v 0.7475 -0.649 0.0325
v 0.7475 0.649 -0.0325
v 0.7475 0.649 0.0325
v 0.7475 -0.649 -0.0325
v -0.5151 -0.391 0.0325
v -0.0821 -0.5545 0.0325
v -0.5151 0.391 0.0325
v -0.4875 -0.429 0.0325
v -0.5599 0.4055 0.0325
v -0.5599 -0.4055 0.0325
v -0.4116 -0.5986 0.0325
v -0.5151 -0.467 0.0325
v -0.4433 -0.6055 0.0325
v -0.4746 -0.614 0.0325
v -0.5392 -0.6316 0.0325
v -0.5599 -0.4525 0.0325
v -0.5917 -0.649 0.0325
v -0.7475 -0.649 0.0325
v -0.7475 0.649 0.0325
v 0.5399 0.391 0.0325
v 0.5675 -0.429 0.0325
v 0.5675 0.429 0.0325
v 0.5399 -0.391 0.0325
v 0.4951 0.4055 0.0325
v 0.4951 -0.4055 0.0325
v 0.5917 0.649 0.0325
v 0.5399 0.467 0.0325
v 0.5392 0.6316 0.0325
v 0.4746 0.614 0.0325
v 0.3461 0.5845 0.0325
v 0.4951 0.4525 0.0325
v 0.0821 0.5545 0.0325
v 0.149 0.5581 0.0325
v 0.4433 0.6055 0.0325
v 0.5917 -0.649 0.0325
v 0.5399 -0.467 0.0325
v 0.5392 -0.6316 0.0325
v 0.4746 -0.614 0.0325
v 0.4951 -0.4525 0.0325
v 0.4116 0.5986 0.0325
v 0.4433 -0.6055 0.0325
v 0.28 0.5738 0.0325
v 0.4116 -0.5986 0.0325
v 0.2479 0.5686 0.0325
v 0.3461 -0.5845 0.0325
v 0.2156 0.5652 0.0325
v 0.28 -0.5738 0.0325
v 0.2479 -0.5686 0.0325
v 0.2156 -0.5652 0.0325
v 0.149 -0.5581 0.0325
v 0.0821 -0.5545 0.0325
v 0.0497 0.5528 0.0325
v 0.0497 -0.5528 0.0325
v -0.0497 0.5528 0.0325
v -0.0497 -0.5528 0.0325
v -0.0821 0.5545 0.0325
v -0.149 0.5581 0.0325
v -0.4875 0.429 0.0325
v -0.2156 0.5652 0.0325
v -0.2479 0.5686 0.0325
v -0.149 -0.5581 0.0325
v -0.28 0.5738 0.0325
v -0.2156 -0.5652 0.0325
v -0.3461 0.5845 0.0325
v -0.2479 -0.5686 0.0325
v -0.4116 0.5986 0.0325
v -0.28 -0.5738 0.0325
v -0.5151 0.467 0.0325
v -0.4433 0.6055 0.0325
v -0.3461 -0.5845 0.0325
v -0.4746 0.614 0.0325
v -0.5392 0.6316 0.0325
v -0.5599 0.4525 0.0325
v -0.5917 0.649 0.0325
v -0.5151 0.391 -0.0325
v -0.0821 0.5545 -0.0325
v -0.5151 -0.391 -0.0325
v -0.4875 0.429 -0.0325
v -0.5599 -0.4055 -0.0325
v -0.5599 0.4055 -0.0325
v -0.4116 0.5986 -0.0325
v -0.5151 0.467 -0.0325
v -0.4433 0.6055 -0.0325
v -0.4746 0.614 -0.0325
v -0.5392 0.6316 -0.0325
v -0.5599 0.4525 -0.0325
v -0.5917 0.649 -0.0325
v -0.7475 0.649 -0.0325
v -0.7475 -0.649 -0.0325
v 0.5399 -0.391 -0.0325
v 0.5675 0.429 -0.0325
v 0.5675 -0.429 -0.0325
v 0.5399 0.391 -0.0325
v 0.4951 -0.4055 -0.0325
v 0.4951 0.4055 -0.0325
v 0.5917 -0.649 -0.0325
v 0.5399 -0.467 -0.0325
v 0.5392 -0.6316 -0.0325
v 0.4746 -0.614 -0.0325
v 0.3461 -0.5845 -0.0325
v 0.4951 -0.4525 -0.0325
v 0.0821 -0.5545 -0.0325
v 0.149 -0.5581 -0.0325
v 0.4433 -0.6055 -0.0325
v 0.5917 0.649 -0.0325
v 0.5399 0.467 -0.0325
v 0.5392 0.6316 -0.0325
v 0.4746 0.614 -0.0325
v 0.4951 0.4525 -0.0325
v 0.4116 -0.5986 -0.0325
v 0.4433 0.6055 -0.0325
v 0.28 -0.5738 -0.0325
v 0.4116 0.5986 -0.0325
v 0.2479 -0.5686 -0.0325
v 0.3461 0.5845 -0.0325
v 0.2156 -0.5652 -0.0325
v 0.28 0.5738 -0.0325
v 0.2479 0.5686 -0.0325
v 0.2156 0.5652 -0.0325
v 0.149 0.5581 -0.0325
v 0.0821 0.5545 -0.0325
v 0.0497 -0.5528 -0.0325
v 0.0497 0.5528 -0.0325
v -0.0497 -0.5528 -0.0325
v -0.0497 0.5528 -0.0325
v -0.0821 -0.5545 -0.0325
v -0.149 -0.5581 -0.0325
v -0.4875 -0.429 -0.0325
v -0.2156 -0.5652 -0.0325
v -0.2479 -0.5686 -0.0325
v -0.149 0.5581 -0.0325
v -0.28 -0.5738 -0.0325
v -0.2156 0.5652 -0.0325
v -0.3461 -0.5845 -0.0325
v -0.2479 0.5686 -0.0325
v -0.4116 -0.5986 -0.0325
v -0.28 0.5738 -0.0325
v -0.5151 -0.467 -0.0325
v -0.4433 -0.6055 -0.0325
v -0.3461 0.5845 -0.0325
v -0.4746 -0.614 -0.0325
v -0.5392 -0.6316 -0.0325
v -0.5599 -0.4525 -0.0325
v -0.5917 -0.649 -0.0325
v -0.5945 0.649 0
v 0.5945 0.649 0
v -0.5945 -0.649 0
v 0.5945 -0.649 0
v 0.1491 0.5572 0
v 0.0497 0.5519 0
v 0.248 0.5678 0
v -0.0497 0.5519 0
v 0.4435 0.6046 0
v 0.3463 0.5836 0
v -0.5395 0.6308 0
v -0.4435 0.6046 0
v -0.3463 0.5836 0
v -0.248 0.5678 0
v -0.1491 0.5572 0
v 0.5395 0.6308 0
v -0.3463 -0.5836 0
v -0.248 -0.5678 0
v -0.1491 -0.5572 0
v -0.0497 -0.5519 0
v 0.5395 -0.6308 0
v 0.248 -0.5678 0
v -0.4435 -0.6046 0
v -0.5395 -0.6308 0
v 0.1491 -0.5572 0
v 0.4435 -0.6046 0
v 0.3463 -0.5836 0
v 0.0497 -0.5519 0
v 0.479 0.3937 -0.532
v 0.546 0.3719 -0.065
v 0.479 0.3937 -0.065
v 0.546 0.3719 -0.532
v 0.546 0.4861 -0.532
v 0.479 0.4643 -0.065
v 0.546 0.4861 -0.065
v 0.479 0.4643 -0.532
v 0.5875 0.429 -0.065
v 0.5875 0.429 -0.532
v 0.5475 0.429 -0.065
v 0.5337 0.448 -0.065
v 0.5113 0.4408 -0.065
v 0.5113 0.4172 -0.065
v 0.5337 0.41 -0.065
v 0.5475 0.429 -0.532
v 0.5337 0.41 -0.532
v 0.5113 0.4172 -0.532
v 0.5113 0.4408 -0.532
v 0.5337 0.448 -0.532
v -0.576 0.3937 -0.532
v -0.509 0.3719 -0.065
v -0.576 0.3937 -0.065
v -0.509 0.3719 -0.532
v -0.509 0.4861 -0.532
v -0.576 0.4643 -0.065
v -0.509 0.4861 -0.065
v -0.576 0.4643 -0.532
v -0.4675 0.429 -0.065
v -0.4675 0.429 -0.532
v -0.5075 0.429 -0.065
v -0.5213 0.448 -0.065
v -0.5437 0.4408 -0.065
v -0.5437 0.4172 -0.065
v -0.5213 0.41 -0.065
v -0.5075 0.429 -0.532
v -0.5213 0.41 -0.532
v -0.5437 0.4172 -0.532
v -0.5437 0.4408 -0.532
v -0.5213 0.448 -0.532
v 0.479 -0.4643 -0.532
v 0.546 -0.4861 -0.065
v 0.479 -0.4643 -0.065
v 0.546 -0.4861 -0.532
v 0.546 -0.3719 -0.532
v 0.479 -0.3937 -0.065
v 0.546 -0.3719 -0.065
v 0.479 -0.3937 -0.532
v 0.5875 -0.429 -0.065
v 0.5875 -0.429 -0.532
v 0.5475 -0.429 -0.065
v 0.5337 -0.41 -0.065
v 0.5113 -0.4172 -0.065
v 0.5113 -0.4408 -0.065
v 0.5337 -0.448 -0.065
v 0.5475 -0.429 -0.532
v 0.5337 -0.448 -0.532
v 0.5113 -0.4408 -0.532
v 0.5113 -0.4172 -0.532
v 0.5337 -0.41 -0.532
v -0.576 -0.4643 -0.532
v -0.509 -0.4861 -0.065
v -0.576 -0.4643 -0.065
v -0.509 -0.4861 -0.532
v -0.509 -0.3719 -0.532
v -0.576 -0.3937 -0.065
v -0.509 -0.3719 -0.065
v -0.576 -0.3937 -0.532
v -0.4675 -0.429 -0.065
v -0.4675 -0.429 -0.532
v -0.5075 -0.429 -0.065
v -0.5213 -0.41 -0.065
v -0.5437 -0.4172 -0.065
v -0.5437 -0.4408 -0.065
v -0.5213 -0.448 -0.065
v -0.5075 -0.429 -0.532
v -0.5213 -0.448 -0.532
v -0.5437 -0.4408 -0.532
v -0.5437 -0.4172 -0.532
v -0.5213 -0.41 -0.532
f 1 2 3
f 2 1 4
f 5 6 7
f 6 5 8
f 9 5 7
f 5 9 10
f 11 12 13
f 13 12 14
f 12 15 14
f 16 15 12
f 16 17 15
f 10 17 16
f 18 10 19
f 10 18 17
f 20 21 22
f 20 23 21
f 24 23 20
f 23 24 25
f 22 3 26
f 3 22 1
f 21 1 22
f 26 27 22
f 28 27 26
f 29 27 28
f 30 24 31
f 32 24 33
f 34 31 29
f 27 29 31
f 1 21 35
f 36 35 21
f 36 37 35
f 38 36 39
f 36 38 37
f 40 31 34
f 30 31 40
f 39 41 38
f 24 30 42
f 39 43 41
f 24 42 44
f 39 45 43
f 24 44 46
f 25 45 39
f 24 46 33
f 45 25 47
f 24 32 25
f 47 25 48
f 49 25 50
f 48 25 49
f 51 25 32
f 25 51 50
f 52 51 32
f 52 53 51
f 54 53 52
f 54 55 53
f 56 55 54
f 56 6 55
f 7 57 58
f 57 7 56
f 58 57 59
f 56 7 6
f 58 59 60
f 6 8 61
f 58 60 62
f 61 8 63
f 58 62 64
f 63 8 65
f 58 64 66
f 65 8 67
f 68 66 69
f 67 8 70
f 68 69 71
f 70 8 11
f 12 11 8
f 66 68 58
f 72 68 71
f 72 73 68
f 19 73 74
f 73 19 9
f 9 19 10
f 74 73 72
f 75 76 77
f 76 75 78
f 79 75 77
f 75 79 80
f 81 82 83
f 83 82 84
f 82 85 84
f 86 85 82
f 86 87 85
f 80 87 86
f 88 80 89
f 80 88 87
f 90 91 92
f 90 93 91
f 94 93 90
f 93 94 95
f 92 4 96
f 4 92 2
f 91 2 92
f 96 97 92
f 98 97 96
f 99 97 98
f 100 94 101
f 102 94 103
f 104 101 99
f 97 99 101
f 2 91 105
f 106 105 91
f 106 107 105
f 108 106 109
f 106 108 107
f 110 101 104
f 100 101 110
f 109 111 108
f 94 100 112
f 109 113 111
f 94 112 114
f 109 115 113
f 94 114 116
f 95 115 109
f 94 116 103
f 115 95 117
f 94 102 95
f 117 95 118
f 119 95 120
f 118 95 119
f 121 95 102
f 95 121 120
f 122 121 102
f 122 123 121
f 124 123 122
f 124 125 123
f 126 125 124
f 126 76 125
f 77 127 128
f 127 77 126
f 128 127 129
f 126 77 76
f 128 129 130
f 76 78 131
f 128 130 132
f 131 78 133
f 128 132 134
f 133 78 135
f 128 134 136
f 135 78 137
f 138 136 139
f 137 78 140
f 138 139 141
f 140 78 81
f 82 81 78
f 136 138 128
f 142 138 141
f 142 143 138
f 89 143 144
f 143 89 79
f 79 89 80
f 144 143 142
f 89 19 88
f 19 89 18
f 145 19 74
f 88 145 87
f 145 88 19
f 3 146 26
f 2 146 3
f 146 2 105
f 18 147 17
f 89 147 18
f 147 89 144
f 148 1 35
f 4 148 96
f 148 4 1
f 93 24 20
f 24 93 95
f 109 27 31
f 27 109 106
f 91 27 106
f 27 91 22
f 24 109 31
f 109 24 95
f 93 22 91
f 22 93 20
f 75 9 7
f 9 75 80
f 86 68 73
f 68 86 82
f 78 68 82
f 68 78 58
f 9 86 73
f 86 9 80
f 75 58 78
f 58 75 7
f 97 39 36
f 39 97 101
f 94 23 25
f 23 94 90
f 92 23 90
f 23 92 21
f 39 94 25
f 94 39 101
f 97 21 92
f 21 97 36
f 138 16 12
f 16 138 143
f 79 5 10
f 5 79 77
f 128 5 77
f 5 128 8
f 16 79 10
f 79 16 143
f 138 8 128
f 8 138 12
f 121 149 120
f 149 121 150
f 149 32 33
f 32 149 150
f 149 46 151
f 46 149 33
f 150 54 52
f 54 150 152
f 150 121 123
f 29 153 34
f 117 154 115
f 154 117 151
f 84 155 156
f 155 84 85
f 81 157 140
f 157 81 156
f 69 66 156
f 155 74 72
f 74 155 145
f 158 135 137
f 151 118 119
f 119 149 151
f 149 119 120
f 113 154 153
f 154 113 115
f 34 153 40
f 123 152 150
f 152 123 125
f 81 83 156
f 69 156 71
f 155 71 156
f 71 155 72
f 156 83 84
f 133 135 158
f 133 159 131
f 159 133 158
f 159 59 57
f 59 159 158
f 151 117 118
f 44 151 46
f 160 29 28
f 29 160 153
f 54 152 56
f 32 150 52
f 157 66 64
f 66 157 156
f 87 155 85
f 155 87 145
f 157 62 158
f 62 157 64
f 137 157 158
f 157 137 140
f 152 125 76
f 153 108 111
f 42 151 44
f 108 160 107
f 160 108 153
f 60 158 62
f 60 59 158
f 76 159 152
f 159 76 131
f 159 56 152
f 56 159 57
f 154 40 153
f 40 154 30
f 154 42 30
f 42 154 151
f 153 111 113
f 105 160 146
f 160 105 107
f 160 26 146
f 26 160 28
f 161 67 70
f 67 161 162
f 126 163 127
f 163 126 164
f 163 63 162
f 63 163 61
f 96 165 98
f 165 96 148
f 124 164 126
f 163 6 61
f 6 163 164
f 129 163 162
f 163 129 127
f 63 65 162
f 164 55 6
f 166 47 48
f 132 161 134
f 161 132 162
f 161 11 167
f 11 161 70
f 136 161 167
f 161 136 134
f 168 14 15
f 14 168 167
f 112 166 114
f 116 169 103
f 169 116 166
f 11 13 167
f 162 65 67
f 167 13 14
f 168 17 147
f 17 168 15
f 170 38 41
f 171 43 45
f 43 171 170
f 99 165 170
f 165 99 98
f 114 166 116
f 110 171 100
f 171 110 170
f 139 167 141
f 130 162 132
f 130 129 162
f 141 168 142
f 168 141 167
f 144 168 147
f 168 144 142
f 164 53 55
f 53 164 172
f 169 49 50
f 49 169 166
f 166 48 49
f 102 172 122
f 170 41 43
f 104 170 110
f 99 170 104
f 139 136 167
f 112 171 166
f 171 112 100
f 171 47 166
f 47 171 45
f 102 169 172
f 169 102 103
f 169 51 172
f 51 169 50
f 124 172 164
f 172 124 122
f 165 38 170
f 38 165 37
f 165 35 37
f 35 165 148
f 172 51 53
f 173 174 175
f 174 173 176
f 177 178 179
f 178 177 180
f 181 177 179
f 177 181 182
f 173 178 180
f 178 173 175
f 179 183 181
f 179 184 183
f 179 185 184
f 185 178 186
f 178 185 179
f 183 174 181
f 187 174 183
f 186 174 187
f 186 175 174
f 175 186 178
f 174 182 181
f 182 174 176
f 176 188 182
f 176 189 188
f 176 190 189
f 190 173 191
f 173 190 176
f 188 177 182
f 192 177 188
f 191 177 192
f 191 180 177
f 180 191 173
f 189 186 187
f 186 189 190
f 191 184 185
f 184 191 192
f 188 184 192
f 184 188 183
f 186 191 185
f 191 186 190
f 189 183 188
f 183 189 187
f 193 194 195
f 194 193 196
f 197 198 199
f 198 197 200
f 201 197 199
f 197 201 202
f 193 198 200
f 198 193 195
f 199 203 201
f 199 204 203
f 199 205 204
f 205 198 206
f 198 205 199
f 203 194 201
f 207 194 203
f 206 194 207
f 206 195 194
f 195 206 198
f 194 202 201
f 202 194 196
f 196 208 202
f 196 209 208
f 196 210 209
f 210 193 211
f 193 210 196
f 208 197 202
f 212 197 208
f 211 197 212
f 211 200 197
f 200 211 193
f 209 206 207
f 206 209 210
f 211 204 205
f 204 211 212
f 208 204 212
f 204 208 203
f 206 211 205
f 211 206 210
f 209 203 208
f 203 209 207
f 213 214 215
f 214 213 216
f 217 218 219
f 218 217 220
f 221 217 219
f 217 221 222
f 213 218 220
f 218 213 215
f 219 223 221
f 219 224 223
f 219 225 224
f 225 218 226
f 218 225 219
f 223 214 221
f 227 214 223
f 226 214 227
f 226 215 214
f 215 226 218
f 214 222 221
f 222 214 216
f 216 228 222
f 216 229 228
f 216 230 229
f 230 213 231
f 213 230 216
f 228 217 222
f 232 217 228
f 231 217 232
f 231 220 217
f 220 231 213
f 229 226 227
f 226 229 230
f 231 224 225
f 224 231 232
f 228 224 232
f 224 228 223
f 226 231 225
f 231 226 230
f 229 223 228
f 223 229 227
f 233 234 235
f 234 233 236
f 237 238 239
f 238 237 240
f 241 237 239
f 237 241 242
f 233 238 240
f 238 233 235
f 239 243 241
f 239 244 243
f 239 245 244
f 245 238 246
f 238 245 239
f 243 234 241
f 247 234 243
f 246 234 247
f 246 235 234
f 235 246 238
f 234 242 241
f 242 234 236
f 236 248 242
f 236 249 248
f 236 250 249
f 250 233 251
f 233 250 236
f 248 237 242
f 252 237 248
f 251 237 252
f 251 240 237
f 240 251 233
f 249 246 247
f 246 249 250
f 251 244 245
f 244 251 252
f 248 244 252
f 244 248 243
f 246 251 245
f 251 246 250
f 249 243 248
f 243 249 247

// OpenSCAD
// file: caster_post.scad
post_height = 0.467;
screw_hole = 0.04;

module caster_post() {
    difference() {
        cylinder(h = post_height, r = screw_hole * 1.5);
        translate([0, 0, -.25])
        cylinder(h = post_height + .4, r = screw_hole - .02);
    }
}
//caster_post();
// file: caster_platform.scad
//$fa=1;
//$fs=0.01;

$fa = 1;
$fs = 0.1;

include <caster_post.scad>

platform_length = 1.298;
platform_width = 1.495;
platform_height = 0.065;

screw_hole_offset = 0.22;
screw_length_seperation = 0.848;
screw_width_seperation = 1.094;

module caster_platform() {
    difference() {
        cube([platform_width, platform_length, platform_height], center = true);
        
        // screw hole
        translate(
        [
            platform_width / 2 - screw_hole_offset, 
            platform_length / 2 - screw_hole_offset, 
            -platform_height
        ])
        cylinder(h = platform_height * 2, r = screw_hole);
    
        // screw hole
        translate(
        [
            -platform_width / 2 + screw_hole_offset, 
            platform_length / 2 - screw_hole_offset, 
            -platform_height
        ])
        cylinder(h = platform_height * 2, r = screw_hole);
    
        // screw hole
        translate(
        [
            platform_width / 2 - screw_hole_offset, 
            -platform_length / 2 + screw_hole_offset, 
            -platform_height
        ])
        cylinder(h = platform_height * 2, r = screw_hole);
    
        // screw hole
        translate(
        [
            -platform_width / 2 + screw_hole_offset, 
            -platform_length / 2 + screw_hole_offset, 
            -platform_height
        ])
        cylinder(h = platform_height * 2, r = screw_hole);

        // side cutout
        translate([0, 2.42, 0])
        sphere(d = platform_width * 2.5);

        // side cutout
        translate([0, -2.42, 0])
        sphere(d = platform_width * 2.5);
    }
    
    translate(
    [
        platform_width / 2 - screw_hole_offset, 
        platform_length / 2 - screw_hole_offset, 
        -platform_height - post_height
    ])
    caster_post();

    translate(
    [
        -platform_width / 2 + screw_hole_offset, 
        platform_length / 2 - screw_hole_offset, 
        -platform_height - post_height
    ])
    caster_post();
 
    translate(
    [
        platform_width / 2 - screw_hole_offset, 
        -platform_length / 2 + screw_hole_offset, 
        -platform_height - post_height
    ])
    caster_post();
 
    translate(
    [
        -platform_width / 2 + screw_hole_offset, 
        -platform_length / 2 + screw_hole_offset, 
        -platform_height - post_height
    ])
    caster_post();
    
    
 }
caster_platform();
// main file
$fa=1;
$fs=0.01;

use <caster_platform.scad>


caster_radius = 0.986 / 2;

wheel_radius = 0.986 / 2;
wheel_width = 0.500;

module caster() {
    caster_platform();
}
caster();
